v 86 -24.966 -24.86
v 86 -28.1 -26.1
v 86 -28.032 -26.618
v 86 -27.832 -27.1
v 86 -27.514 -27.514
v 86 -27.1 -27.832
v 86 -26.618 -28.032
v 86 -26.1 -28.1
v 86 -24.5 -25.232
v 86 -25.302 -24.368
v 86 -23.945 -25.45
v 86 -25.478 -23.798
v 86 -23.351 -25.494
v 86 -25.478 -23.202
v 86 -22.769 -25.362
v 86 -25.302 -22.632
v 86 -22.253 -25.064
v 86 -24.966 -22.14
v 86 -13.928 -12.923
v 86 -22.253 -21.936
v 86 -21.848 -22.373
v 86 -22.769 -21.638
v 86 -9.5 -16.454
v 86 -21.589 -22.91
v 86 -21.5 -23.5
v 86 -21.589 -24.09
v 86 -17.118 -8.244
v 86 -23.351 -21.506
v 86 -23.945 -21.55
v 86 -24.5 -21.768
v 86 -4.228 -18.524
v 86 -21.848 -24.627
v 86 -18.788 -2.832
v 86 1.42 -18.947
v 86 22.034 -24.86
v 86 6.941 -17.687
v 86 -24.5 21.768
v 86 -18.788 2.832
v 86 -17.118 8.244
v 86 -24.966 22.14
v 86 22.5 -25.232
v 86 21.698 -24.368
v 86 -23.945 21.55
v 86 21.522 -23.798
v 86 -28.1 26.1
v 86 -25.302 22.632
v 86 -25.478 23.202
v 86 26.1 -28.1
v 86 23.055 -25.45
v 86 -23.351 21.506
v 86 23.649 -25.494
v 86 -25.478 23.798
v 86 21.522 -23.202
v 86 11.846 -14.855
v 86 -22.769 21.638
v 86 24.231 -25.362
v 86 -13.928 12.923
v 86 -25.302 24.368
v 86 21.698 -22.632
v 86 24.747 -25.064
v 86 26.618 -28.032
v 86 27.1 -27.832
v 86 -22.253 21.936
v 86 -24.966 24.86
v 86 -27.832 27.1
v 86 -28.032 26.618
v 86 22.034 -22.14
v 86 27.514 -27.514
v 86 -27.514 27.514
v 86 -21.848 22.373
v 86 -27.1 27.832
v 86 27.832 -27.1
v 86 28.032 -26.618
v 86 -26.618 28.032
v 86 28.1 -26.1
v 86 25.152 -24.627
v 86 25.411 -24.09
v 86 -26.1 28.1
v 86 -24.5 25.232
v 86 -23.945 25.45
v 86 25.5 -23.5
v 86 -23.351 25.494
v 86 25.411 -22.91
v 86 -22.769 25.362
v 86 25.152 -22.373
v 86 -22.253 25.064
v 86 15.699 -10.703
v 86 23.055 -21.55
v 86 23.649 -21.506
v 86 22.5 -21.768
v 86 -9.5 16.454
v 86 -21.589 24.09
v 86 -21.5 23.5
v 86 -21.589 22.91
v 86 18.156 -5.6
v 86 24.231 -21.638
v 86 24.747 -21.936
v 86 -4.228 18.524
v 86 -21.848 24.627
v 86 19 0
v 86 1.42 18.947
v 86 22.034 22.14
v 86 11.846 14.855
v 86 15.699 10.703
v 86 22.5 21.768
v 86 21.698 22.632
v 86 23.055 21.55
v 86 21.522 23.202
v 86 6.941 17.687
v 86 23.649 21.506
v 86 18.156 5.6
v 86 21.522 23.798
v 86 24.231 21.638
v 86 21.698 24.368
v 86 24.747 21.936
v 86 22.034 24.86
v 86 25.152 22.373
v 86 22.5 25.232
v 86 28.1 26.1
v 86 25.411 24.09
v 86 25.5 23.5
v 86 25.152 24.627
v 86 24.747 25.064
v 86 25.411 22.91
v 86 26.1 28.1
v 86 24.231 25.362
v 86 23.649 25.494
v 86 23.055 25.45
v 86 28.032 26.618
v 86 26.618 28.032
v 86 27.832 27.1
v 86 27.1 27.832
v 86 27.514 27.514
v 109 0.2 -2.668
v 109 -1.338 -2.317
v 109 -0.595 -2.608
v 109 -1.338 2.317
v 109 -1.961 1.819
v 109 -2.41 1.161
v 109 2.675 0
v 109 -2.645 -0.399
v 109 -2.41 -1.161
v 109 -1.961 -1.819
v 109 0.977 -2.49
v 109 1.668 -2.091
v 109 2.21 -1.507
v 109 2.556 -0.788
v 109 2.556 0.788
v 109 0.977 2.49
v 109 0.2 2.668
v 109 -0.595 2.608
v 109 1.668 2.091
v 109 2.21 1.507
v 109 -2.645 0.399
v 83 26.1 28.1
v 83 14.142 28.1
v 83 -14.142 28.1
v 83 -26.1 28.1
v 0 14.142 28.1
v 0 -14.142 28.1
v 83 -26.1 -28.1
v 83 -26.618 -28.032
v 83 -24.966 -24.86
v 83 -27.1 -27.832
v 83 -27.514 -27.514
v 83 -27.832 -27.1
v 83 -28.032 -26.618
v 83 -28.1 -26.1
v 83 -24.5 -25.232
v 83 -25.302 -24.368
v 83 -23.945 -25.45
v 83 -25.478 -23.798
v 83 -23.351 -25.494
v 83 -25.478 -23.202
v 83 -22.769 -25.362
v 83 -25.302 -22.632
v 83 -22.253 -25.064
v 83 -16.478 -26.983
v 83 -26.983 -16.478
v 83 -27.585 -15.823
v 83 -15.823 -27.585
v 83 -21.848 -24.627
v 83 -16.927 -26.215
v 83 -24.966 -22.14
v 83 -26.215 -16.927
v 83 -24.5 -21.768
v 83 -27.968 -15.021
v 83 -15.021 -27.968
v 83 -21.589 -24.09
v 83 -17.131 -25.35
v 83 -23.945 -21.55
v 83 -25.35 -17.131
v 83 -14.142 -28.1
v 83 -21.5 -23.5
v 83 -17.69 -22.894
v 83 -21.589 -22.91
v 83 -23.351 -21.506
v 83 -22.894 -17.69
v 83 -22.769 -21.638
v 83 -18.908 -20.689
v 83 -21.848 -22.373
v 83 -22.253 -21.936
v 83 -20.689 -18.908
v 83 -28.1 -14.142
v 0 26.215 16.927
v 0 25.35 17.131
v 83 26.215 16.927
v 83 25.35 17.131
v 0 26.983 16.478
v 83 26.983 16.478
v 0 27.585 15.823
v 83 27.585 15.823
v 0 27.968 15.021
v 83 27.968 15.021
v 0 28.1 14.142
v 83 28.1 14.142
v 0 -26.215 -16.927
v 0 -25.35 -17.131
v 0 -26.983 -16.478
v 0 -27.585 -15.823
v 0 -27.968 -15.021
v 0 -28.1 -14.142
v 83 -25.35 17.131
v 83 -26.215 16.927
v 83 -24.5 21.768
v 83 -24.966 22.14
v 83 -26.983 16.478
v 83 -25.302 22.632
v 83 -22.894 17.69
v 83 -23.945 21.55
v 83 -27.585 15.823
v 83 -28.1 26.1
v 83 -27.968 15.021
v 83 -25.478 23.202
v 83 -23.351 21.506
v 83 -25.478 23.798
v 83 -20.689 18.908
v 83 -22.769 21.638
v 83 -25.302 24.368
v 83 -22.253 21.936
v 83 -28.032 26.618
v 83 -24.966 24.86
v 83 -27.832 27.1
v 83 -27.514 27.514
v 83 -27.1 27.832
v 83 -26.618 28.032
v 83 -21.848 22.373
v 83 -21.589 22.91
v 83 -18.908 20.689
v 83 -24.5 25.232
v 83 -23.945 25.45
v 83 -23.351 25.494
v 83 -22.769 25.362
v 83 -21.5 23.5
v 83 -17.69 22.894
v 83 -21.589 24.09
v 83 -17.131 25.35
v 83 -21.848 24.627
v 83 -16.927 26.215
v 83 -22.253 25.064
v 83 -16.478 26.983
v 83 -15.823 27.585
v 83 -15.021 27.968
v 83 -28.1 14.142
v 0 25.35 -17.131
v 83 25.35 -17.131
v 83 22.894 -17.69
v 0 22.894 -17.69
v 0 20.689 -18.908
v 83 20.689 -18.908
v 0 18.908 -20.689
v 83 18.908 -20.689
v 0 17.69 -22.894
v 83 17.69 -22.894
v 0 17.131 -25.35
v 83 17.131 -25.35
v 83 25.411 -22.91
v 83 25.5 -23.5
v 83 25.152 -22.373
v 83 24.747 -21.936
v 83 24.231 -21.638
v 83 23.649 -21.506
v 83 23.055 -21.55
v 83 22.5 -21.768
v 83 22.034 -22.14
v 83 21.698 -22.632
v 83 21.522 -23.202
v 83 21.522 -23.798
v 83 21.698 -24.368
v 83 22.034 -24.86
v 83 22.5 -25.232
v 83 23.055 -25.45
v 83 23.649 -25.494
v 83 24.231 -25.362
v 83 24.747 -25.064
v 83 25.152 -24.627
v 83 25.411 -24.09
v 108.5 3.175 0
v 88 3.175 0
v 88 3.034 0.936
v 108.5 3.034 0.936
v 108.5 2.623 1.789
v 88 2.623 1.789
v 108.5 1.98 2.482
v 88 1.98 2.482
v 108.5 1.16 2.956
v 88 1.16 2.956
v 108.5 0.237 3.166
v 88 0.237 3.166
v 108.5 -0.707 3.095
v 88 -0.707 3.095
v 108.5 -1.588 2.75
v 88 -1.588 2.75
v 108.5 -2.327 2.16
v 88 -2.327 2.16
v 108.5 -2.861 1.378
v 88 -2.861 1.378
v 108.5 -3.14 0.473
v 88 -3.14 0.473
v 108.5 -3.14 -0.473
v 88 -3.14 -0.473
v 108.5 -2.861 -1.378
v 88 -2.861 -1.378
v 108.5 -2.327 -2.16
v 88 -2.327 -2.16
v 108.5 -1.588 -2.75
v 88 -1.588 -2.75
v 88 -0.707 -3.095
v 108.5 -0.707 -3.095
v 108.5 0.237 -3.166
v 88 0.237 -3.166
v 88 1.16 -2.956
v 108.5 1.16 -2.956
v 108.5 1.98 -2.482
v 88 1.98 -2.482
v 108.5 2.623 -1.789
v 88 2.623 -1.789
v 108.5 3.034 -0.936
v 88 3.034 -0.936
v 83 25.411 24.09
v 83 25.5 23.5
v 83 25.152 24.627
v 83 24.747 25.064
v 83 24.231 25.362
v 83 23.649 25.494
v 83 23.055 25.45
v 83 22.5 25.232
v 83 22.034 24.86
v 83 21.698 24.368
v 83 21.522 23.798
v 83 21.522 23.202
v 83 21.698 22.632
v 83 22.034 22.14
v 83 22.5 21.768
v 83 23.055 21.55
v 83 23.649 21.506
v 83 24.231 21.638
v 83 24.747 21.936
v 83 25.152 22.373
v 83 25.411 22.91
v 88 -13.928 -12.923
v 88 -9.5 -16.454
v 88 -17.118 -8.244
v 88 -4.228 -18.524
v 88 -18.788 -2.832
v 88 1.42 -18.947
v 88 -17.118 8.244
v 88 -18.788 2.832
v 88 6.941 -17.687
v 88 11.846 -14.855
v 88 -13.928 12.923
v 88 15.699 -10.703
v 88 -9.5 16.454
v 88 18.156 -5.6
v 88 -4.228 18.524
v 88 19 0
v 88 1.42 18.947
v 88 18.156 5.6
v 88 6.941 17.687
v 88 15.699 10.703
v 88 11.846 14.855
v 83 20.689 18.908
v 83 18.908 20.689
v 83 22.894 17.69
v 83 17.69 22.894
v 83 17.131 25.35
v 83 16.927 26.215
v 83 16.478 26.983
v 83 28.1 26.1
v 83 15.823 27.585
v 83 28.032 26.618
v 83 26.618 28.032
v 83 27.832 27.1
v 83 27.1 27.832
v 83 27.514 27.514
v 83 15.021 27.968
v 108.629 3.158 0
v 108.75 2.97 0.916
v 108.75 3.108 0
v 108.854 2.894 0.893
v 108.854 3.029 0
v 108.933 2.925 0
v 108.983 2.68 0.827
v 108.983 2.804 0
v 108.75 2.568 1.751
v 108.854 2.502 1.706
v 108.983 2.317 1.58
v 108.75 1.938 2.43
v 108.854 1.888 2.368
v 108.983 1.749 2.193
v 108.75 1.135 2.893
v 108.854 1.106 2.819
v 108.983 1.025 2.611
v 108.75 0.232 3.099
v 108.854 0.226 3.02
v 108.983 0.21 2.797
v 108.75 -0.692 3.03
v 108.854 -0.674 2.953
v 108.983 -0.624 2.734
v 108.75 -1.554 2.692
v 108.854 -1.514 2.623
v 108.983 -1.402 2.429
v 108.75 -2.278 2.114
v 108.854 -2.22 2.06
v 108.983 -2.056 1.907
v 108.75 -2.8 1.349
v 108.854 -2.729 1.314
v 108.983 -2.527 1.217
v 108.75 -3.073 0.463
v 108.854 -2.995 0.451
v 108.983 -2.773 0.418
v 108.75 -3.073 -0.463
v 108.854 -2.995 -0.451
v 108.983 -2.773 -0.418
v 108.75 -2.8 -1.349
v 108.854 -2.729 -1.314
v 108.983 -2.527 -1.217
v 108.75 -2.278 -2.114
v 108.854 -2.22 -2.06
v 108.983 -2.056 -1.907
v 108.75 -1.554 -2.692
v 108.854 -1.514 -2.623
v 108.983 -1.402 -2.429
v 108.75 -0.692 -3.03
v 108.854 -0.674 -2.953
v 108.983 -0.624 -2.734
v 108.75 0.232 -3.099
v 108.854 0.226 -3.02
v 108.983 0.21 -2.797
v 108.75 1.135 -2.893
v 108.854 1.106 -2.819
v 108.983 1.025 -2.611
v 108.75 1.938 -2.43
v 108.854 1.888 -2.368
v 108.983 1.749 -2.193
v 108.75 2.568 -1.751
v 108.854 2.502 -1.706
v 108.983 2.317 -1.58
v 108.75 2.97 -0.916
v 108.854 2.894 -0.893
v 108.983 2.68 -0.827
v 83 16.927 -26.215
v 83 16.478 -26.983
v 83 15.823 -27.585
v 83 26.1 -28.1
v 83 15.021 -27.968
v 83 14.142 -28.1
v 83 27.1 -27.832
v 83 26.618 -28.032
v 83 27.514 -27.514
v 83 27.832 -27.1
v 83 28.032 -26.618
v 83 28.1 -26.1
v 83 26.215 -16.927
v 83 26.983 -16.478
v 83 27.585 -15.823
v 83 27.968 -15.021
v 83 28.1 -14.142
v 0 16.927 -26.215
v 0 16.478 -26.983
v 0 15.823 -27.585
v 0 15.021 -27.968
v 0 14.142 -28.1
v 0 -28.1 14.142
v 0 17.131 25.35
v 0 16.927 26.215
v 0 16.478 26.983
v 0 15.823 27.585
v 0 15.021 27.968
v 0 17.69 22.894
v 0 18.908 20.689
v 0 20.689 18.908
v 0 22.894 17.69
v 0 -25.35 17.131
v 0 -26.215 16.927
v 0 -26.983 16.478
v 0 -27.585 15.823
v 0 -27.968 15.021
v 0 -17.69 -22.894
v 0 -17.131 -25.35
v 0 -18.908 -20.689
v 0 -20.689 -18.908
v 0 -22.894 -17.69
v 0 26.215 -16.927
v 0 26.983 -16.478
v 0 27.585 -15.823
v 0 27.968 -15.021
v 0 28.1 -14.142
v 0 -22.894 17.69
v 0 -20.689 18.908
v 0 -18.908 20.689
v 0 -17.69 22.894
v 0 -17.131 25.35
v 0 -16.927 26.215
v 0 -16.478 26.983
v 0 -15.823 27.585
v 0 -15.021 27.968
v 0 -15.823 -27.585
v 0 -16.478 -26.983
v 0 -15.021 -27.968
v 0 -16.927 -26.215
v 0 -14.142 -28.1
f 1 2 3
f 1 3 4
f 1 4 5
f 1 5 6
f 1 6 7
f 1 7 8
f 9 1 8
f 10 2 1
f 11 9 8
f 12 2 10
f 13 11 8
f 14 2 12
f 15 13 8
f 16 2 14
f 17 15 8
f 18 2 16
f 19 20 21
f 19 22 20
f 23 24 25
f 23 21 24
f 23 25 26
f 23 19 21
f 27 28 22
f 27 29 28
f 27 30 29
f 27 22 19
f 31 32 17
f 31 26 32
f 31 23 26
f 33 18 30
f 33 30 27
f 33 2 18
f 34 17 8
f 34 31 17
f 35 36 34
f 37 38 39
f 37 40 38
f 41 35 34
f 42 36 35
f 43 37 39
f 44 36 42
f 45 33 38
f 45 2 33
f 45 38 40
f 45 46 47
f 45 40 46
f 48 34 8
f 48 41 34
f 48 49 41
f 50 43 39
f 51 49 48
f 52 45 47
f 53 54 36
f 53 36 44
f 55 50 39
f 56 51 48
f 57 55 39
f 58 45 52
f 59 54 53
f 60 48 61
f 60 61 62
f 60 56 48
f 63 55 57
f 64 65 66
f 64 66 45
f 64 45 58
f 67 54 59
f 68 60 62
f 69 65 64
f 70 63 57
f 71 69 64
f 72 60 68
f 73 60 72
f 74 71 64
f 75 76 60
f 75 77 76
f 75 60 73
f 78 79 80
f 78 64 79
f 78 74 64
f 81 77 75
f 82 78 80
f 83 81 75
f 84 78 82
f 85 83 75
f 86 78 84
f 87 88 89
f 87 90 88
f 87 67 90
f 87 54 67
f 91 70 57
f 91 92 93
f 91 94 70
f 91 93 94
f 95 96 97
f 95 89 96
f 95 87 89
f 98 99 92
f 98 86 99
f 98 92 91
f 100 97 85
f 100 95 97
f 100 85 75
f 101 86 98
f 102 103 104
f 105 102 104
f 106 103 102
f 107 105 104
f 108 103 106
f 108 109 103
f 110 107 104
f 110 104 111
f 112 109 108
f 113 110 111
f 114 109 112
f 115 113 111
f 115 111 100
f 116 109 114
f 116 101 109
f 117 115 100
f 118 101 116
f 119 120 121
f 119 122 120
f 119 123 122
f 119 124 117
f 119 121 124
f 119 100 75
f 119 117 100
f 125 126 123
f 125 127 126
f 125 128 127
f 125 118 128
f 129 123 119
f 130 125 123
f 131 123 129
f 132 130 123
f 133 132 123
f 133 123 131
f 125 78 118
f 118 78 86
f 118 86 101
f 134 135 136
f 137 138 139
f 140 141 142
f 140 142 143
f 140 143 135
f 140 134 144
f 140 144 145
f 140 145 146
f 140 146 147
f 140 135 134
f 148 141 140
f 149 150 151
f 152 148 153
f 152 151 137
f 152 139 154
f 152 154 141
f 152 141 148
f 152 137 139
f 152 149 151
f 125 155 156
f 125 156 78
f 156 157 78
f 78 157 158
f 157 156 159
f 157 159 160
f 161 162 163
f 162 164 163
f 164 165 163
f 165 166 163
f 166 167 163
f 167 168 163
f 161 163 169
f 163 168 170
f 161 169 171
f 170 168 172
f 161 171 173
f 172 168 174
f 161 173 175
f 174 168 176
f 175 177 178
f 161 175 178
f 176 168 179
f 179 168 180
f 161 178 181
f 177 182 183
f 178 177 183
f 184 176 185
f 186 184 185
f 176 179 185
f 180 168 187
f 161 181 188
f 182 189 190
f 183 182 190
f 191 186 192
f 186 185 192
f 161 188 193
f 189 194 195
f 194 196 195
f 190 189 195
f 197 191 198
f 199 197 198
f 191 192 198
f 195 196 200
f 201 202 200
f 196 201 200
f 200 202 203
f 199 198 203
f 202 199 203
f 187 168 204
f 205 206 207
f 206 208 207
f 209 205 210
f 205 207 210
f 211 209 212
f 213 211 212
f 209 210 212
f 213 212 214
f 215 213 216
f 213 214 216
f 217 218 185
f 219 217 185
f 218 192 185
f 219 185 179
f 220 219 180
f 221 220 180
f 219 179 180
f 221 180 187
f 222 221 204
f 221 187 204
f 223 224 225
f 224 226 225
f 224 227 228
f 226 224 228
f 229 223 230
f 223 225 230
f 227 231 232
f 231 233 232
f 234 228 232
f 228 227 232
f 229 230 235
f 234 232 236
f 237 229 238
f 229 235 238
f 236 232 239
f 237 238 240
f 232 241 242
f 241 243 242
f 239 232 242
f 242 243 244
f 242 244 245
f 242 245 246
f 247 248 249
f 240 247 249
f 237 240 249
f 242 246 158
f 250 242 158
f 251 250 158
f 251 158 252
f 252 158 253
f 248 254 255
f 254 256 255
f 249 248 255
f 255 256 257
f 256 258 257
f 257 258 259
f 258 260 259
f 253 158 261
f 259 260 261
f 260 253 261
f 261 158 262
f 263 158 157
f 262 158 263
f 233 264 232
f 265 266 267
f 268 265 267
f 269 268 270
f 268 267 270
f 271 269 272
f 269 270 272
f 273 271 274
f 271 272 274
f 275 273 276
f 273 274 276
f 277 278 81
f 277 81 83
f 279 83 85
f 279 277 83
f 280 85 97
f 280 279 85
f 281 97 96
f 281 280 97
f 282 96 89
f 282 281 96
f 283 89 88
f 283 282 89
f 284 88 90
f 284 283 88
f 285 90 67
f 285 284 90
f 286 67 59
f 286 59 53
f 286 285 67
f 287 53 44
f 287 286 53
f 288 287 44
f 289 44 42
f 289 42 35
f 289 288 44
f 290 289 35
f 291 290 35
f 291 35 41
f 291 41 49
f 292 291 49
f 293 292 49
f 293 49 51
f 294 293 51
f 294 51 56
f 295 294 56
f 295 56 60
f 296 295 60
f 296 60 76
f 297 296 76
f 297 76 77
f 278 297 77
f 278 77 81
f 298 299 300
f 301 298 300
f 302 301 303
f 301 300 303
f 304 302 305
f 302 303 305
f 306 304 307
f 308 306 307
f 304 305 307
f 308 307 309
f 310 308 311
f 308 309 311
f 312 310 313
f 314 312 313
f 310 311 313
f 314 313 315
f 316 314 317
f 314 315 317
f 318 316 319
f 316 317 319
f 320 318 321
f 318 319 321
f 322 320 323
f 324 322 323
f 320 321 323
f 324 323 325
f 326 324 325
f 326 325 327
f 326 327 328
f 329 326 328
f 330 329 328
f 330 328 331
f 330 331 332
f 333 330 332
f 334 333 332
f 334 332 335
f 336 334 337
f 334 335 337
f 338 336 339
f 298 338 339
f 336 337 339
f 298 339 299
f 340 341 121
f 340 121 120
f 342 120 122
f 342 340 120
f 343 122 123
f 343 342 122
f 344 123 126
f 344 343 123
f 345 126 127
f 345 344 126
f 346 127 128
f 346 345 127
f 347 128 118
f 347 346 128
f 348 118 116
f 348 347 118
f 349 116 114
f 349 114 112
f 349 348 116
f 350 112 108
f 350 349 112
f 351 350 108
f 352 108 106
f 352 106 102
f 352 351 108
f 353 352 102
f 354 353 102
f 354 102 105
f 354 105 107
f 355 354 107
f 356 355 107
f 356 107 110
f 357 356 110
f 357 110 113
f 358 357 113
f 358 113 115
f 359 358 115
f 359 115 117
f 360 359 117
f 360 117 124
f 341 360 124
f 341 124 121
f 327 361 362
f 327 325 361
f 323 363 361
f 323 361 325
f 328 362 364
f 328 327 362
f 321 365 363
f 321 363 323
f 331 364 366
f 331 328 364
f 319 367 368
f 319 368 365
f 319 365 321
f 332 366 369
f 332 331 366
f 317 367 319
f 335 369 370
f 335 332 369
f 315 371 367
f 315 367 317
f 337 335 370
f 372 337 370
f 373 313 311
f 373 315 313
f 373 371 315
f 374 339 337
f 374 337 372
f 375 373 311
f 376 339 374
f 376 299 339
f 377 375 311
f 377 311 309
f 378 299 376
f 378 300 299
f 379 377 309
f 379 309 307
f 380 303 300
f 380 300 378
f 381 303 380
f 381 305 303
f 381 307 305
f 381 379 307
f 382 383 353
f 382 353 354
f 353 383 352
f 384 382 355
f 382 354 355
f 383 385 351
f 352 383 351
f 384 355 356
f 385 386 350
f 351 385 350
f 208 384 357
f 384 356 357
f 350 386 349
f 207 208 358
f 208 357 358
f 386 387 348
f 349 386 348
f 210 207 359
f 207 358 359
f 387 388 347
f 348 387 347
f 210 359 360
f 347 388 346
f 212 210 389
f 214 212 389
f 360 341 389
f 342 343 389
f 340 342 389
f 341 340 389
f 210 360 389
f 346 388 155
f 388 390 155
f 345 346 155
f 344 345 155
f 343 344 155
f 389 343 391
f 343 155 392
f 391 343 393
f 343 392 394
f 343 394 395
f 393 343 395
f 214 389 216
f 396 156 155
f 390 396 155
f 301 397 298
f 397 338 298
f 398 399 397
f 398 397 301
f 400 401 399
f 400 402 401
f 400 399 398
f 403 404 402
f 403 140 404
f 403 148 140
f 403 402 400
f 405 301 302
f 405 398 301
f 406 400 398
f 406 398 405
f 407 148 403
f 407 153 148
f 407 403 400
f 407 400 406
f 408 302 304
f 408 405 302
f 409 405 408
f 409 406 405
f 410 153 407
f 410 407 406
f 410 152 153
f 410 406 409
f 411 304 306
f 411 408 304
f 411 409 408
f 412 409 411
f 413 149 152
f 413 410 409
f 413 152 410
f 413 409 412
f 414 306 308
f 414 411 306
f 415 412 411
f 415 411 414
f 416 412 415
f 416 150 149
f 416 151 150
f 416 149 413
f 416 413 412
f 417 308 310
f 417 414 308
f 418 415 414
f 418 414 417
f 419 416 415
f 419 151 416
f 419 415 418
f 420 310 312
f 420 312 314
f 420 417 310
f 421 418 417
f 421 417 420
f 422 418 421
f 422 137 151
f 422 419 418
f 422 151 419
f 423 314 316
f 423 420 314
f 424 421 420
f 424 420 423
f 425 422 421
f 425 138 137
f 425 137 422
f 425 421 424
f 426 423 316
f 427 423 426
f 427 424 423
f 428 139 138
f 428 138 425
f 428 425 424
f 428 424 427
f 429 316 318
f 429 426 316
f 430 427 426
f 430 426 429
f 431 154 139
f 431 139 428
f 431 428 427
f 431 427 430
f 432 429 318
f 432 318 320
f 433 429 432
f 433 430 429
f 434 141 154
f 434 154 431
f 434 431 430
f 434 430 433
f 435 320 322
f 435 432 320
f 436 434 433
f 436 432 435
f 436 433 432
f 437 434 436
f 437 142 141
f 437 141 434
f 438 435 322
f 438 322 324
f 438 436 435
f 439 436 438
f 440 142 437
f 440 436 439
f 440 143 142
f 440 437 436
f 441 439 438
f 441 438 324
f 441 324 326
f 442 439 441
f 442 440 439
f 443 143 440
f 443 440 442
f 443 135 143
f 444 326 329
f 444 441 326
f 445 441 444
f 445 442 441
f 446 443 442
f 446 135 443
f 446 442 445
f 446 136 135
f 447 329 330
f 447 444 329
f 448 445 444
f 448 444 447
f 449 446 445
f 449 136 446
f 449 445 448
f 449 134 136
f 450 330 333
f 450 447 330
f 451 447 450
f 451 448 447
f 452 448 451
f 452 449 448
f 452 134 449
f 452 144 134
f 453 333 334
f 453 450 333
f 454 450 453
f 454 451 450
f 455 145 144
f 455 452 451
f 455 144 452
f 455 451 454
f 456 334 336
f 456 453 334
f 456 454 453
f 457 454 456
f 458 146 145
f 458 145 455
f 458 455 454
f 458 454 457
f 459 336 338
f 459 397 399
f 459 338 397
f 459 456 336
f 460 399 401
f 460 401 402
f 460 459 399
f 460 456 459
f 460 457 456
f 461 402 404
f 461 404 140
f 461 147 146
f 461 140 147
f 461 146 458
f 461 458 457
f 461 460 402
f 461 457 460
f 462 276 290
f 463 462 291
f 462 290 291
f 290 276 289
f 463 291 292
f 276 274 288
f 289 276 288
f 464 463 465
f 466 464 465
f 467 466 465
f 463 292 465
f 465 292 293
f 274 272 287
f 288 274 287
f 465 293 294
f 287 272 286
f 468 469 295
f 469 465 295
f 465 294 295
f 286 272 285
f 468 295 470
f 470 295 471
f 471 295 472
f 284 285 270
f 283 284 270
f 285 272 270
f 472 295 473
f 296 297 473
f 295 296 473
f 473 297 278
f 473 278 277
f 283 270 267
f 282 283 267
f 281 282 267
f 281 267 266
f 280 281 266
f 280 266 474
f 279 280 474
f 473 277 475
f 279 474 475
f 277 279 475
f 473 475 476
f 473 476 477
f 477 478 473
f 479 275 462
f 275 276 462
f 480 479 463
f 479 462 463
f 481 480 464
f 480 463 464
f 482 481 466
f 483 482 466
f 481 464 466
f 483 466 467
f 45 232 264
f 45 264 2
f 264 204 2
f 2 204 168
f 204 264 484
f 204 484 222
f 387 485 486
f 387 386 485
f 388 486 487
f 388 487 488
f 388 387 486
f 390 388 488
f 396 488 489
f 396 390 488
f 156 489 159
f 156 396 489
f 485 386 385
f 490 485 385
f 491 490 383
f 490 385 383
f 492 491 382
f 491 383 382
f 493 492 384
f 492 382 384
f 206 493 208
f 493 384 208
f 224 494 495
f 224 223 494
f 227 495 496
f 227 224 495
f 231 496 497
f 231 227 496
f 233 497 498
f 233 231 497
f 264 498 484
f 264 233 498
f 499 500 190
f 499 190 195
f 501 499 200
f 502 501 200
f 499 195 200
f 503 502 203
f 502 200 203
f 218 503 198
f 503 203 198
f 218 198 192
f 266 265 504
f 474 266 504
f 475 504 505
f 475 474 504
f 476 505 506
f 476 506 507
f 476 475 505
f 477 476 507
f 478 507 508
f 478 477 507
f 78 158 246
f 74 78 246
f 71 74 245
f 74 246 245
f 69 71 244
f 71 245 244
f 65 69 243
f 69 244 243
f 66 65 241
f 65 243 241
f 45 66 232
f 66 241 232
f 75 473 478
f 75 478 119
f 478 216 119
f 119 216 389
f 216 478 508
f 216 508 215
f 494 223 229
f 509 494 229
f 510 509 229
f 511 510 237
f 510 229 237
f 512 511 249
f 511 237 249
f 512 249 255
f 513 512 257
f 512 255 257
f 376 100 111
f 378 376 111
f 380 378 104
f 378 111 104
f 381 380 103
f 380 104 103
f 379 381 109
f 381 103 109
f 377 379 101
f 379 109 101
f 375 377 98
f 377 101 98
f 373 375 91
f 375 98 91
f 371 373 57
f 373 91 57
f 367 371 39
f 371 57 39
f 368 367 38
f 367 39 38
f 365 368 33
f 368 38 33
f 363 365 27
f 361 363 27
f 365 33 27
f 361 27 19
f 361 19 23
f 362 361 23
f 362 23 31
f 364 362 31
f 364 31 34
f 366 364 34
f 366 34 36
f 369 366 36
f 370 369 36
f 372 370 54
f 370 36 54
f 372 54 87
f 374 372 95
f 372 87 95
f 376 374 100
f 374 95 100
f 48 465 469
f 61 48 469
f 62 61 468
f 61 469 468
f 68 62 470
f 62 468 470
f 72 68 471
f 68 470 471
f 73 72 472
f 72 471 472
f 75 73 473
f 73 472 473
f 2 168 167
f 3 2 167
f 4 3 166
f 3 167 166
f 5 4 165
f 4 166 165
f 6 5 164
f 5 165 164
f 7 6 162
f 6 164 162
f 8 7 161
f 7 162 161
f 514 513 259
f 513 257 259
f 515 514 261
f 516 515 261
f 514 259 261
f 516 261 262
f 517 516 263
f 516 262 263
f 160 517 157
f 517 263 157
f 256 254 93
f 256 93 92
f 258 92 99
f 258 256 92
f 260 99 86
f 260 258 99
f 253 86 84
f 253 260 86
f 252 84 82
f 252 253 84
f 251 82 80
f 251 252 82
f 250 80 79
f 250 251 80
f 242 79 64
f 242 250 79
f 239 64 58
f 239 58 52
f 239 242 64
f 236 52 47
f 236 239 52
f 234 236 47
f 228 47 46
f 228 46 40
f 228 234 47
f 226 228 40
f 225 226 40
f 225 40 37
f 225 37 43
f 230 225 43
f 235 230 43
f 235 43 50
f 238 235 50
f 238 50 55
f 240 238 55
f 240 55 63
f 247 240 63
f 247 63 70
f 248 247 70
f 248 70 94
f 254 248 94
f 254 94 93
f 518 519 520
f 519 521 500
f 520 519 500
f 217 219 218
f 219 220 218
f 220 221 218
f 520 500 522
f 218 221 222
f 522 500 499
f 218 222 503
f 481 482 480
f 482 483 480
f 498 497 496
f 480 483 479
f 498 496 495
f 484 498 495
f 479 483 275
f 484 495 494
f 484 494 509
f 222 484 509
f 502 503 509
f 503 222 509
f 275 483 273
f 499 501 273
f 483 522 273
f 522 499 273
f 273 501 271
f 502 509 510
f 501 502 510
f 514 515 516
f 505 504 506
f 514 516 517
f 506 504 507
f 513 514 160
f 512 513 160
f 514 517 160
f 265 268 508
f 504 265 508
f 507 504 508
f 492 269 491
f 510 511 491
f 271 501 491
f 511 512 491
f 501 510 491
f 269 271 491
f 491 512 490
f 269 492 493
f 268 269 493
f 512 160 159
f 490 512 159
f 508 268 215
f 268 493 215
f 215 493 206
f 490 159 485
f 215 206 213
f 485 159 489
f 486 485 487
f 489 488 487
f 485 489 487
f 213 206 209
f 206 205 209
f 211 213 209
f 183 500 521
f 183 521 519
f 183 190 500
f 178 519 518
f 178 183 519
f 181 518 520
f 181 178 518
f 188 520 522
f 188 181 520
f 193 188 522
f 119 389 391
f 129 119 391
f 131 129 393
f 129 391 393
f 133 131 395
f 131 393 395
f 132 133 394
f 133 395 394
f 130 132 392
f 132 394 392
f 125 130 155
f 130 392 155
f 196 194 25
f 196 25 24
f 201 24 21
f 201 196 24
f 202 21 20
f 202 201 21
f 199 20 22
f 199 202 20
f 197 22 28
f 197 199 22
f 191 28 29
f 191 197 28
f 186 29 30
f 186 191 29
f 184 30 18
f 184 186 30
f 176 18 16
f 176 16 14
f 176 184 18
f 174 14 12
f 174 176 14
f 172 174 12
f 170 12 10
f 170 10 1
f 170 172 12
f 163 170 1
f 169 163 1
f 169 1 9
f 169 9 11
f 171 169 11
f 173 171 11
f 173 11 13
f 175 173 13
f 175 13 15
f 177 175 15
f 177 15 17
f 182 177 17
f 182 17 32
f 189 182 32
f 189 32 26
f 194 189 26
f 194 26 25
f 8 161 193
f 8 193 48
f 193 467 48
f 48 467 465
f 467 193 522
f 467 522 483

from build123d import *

# Parameters (mm, degrees)
F0_R     = 2
F1_DEPTH = 86
F2_R     = 19
F3_DEPTH = 2
F4_R     = 3.175
F5_DEPTH = 21
F6_R     = 0.5
F8_R     = 9
F9_DEPTH = 83
F10_R    = 3


# Not quite as in the source:
# - a feature names something its author has since deleted; it is built from what else it names


with BuildPart() as f1:
    # F0 (on Right) → F1 (new body)
    with BuildSketch(Plane.YZ):
        with BuildLine():
            Line((26.1, 28.1), (-26.1, 28.1))
            ThreePointArc((-26.1, 28.1), (-27.5142135624, 27.5142135624), (-28.1, 26.1))
            Line((-28.1, 26.1), (-28.1, -26.1))
            ThreePointArc((-28.1, -26.1), (-27.5142135624, -27.5142135624), (-26.1, -28.1))
            Line((-26.1, -28.1), (26.1, -28.1))
            ThreePointArc((26.1, -28.1), (27.5142135624, -27.5142135624), (28.1, -26.1))
            Line((28.1, -26.1), (28.1, 26.1))
            ThreePointArc((28.1, 26.1), (27.5142135624, 27.5142135624), (26.1, 28.1))
        make_face()
        with Locations((-23.5, -23.5)):
            Circle(F0_R, mode=Mode.SUBTRACT)
        with Locations((23.5, -23.5)):
            Circle(F0_R, mode=Mode.SUBTRACT)
        with Locations((-23.5, 23.5)):
            Circle(F0_R, mode=Mode.SUBTRACT)
        with Locations((23.5, 23.5)):
            Circle(F0_R, mode=Mode.SUBTRACT)
    extrude(amount=F1_DEPTH)

    # F2 (on face) → F3 (join)
    with BuildSketch(Plane.YZ.offset(86)):
        Circle(F2_R)
    extrude(amount=F3_DEPTH)

    # F4 (on face) → F5 (join)
    with BuildSketch(Plane.YZ.offset(88)):
        Circle(F4_R)
    extrude(amount=F5_DEPTH)

    # F6
    f6_edges = [f1.edges().sort_by_distance(p)[0] for p in [
        (109, -3.175, 0),
    ]]
    fillet(f6_edges, radius=F6_R)

    # F8 (on offset) → F9 (cut, through all)
    with BuildSketch(Plane.YZ.offset(83)):
        with Locations((-26.1, 26.1)):
            Circle(F8_R)
        with Locations((26.1, 26.1)):
            Circle(F8_R)
        with Locations((-26.1, -26.1)):
            Circle(F8_R)
        with Locations((26.1, -26.1)):
            Circle(F8_R)
    extrude(amount=-F9_DEPTH, mode=Mode.SUBTRACT)

    # F10
    f10_edges = [f1.edges().sort_by_distance(p)[0] for p in [
        (41.5, 17.325036, 28.1),
        (41.5, 28.1, 17.325036),
        (41.5, -17.325036, 28.1),
        (41.5, -28.1, 17.325036),
        (41.5, -28.1, -17.325036),
        (41.5, -17.325036, -28.1),
        (41.5, 17.325036, -28.1),
        (41.5, 28.1, -17.325036),
    ]]
    fillet(f10_edges, radius=F10_R)


solid = f1.part
